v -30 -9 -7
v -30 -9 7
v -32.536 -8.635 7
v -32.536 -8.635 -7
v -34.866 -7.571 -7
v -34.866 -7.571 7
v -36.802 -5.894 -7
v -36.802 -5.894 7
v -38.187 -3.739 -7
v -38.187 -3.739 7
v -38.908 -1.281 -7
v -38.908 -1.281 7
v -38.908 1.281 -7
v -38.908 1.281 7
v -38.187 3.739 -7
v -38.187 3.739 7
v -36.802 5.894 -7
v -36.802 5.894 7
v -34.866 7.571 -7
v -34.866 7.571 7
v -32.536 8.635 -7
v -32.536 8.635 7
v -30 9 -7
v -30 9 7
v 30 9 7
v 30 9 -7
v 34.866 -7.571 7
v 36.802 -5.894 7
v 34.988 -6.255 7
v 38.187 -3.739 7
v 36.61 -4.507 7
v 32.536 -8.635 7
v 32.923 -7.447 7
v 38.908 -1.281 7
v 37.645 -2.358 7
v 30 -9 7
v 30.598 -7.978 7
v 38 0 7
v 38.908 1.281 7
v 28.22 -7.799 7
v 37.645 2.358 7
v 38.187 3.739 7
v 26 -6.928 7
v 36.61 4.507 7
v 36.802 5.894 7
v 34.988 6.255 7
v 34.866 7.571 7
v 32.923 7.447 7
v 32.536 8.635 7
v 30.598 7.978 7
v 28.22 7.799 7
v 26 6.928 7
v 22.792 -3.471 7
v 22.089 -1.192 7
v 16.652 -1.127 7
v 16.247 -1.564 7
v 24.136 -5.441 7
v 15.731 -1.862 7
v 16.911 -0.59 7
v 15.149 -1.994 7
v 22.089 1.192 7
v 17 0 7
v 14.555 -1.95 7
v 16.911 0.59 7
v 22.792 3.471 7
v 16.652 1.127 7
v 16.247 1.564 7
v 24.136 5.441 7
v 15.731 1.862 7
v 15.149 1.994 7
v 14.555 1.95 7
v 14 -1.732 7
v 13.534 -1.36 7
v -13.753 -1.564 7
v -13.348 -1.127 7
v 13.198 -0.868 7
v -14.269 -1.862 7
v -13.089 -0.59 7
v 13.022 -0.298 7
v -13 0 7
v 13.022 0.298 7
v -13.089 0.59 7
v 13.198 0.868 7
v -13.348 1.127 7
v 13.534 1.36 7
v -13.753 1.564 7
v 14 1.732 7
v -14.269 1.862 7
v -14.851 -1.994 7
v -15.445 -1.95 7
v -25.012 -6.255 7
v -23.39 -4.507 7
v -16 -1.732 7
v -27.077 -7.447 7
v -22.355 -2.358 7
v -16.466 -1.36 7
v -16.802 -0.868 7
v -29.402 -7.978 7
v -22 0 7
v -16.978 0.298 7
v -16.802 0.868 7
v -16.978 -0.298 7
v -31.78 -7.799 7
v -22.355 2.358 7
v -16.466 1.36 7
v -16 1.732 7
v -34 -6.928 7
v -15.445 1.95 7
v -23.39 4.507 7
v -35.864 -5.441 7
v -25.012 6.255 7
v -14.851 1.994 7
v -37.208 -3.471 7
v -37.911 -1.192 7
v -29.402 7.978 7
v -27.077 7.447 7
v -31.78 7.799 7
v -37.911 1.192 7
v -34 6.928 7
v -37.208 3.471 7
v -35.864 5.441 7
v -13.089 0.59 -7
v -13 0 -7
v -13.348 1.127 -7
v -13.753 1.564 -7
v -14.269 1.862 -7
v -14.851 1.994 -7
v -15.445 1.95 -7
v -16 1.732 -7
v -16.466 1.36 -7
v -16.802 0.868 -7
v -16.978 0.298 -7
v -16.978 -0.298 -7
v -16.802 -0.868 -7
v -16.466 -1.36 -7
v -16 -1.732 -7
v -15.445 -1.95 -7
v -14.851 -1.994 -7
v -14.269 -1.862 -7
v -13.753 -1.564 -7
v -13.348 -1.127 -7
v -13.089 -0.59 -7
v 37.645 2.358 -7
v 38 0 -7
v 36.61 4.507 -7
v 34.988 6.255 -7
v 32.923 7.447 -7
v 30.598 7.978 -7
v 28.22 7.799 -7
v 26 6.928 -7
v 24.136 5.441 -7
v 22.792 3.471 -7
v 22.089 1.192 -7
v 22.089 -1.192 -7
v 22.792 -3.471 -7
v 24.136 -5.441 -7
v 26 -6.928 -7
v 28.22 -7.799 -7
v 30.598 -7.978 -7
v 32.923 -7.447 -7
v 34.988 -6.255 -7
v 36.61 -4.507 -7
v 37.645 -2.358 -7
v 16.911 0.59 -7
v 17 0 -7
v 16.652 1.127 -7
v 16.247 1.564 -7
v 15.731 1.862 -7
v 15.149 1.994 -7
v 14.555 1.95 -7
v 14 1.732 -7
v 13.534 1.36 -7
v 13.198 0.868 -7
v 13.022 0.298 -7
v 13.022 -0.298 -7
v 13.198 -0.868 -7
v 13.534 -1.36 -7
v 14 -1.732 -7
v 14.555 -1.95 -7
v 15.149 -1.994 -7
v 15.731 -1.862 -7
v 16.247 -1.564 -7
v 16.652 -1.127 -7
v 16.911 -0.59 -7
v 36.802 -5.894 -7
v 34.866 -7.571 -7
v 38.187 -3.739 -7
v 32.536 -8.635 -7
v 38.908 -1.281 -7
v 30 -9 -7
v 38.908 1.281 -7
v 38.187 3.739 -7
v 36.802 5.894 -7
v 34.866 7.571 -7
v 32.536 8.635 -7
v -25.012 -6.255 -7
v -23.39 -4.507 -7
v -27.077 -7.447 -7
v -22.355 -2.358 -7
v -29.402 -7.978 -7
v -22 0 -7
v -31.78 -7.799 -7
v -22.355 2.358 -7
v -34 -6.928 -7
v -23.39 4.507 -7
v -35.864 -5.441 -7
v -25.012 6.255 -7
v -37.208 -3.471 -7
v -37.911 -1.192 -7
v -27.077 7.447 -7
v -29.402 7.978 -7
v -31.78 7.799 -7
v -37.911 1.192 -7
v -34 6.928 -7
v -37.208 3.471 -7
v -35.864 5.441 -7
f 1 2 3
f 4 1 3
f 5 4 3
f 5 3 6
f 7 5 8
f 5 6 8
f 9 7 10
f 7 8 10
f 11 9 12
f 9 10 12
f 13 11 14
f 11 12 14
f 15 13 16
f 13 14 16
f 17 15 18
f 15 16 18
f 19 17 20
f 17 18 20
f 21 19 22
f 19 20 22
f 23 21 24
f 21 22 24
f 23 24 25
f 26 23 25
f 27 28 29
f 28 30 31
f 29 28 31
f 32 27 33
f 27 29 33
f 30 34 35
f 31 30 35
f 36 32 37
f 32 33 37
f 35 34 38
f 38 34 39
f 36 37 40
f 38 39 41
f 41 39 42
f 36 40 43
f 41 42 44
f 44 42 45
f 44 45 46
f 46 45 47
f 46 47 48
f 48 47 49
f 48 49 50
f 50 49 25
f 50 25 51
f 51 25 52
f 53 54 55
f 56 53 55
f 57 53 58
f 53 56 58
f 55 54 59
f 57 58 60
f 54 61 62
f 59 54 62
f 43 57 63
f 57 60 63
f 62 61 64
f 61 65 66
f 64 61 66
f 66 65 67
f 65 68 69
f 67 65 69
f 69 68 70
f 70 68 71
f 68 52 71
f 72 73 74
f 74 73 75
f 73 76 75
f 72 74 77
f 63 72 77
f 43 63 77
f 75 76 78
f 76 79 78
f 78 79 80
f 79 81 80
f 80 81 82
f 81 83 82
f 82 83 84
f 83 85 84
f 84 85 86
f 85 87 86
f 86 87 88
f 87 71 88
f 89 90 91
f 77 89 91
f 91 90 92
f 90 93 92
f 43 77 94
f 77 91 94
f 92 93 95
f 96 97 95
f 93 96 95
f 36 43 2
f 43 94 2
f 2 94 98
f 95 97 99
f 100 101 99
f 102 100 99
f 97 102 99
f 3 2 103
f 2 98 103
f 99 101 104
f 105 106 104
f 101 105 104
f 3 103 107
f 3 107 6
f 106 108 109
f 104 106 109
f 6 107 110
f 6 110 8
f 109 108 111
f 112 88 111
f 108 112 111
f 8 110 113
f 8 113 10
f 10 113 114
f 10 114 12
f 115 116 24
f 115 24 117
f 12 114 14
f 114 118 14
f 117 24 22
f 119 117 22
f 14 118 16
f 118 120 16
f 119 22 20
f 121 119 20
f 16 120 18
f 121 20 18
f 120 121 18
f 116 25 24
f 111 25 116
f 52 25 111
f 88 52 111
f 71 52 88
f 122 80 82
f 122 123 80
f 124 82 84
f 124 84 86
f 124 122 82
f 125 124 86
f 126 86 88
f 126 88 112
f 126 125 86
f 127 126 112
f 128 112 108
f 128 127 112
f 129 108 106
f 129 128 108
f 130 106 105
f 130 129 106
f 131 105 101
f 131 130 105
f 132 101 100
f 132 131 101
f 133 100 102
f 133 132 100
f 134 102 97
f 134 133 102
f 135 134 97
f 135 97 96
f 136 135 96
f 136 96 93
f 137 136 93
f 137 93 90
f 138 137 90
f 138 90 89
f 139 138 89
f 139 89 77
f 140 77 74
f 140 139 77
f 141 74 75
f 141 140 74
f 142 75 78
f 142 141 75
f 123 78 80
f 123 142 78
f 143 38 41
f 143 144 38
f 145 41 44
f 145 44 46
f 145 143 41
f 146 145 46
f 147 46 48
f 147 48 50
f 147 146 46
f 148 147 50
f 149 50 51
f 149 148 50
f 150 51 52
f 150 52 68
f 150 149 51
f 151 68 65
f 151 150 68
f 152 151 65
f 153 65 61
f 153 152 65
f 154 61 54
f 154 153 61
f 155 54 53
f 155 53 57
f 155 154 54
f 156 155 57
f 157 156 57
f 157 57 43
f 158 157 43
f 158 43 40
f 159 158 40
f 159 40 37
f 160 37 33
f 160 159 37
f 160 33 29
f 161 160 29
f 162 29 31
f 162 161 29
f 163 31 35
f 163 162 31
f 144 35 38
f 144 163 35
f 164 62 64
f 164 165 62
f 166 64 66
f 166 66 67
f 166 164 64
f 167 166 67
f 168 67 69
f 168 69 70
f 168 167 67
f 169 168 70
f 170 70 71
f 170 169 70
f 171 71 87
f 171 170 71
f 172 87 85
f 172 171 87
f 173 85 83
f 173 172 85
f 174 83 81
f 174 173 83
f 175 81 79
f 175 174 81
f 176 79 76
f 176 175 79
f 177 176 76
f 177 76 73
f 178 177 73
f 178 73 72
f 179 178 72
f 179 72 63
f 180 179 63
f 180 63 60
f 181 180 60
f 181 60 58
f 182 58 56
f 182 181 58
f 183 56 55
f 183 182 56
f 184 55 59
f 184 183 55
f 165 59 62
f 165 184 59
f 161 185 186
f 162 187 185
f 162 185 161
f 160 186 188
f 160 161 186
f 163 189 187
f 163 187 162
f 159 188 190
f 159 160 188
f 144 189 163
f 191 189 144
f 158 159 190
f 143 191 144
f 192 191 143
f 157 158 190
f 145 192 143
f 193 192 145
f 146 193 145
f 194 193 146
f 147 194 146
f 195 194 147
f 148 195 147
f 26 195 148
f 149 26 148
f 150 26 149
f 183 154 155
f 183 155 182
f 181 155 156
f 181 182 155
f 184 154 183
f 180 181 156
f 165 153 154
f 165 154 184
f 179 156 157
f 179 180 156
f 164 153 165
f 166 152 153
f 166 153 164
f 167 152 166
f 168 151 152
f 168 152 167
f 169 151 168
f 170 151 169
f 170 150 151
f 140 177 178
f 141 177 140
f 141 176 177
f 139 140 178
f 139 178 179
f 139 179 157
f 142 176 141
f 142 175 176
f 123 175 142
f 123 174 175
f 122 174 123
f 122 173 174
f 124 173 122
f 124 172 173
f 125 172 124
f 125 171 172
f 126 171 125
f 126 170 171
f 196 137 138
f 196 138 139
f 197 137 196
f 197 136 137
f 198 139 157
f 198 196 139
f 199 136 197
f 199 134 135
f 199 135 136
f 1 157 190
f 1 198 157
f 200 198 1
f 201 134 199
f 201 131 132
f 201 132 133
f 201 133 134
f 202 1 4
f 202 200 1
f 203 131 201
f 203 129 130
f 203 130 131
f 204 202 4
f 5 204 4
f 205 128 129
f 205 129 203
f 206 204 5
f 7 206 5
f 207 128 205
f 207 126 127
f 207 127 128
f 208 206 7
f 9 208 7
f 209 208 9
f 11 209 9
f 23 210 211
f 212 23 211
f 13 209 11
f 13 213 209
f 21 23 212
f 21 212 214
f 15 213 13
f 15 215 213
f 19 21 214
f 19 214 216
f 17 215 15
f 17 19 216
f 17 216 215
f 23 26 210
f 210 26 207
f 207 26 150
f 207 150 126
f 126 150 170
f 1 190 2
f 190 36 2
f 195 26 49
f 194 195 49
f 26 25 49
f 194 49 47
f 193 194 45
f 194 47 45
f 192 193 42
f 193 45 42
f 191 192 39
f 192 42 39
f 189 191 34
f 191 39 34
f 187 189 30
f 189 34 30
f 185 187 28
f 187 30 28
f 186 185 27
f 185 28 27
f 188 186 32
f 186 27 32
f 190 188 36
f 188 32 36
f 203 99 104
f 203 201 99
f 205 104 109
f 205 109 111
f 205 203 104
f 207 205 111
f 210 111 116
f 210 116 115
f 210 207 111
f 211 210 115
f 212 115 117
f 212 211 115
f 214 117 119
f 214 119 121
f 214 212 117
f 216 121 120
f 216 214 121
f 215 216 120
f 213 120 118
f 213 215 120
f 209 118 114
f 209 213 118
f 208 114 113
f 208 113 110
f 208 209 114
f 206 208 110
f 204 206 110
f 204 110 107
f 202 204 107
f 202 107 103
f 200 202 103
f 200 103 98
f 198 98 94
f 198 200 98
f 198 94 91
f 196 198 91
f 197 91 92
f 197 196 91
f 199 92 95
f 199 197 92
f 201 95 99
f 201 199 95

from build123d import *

# Parameters (mm, degrees)
SKETCH1_R           = 2
SKETCH1_R_2         = 8
BOSS_EXTRUDE1_DEPTH = 7


with BuildPart() as part:
    # Sketch1 → Boss-Extrude1 (new, symmetric)
    with BuildSketch(Plane.XY):
        with BuildLine():
            Line((-30, 9), (30, 9))
            ThreePointArc((30, 9), (39, 0), (30, -9))
            Line((30, -9), (-30, -9))
            ThreePointArc((-30, -9), (-39, 0), (-30, 9))
        make_face()
        with Locations((-15, 0)):
            Circle(SKETCH1_R, mode=Mode.SUBTRACT)
        with Locations((15, 0)):
            Circle(SKETCH1_R, mode=Mode.SUBTRACT)
        with Locations((-30, 0)):
            Circle(SKETCH1_R_2, mode=Mode.SUBTRACT)
        with Locations((30, 0)):
            Circle(SKETCH1_R_2, mode=Mode.SUBTRACT)
    extrude(amount=BOSS_EXTRUDE1_DEPTH, both=True)


solid = part.part
